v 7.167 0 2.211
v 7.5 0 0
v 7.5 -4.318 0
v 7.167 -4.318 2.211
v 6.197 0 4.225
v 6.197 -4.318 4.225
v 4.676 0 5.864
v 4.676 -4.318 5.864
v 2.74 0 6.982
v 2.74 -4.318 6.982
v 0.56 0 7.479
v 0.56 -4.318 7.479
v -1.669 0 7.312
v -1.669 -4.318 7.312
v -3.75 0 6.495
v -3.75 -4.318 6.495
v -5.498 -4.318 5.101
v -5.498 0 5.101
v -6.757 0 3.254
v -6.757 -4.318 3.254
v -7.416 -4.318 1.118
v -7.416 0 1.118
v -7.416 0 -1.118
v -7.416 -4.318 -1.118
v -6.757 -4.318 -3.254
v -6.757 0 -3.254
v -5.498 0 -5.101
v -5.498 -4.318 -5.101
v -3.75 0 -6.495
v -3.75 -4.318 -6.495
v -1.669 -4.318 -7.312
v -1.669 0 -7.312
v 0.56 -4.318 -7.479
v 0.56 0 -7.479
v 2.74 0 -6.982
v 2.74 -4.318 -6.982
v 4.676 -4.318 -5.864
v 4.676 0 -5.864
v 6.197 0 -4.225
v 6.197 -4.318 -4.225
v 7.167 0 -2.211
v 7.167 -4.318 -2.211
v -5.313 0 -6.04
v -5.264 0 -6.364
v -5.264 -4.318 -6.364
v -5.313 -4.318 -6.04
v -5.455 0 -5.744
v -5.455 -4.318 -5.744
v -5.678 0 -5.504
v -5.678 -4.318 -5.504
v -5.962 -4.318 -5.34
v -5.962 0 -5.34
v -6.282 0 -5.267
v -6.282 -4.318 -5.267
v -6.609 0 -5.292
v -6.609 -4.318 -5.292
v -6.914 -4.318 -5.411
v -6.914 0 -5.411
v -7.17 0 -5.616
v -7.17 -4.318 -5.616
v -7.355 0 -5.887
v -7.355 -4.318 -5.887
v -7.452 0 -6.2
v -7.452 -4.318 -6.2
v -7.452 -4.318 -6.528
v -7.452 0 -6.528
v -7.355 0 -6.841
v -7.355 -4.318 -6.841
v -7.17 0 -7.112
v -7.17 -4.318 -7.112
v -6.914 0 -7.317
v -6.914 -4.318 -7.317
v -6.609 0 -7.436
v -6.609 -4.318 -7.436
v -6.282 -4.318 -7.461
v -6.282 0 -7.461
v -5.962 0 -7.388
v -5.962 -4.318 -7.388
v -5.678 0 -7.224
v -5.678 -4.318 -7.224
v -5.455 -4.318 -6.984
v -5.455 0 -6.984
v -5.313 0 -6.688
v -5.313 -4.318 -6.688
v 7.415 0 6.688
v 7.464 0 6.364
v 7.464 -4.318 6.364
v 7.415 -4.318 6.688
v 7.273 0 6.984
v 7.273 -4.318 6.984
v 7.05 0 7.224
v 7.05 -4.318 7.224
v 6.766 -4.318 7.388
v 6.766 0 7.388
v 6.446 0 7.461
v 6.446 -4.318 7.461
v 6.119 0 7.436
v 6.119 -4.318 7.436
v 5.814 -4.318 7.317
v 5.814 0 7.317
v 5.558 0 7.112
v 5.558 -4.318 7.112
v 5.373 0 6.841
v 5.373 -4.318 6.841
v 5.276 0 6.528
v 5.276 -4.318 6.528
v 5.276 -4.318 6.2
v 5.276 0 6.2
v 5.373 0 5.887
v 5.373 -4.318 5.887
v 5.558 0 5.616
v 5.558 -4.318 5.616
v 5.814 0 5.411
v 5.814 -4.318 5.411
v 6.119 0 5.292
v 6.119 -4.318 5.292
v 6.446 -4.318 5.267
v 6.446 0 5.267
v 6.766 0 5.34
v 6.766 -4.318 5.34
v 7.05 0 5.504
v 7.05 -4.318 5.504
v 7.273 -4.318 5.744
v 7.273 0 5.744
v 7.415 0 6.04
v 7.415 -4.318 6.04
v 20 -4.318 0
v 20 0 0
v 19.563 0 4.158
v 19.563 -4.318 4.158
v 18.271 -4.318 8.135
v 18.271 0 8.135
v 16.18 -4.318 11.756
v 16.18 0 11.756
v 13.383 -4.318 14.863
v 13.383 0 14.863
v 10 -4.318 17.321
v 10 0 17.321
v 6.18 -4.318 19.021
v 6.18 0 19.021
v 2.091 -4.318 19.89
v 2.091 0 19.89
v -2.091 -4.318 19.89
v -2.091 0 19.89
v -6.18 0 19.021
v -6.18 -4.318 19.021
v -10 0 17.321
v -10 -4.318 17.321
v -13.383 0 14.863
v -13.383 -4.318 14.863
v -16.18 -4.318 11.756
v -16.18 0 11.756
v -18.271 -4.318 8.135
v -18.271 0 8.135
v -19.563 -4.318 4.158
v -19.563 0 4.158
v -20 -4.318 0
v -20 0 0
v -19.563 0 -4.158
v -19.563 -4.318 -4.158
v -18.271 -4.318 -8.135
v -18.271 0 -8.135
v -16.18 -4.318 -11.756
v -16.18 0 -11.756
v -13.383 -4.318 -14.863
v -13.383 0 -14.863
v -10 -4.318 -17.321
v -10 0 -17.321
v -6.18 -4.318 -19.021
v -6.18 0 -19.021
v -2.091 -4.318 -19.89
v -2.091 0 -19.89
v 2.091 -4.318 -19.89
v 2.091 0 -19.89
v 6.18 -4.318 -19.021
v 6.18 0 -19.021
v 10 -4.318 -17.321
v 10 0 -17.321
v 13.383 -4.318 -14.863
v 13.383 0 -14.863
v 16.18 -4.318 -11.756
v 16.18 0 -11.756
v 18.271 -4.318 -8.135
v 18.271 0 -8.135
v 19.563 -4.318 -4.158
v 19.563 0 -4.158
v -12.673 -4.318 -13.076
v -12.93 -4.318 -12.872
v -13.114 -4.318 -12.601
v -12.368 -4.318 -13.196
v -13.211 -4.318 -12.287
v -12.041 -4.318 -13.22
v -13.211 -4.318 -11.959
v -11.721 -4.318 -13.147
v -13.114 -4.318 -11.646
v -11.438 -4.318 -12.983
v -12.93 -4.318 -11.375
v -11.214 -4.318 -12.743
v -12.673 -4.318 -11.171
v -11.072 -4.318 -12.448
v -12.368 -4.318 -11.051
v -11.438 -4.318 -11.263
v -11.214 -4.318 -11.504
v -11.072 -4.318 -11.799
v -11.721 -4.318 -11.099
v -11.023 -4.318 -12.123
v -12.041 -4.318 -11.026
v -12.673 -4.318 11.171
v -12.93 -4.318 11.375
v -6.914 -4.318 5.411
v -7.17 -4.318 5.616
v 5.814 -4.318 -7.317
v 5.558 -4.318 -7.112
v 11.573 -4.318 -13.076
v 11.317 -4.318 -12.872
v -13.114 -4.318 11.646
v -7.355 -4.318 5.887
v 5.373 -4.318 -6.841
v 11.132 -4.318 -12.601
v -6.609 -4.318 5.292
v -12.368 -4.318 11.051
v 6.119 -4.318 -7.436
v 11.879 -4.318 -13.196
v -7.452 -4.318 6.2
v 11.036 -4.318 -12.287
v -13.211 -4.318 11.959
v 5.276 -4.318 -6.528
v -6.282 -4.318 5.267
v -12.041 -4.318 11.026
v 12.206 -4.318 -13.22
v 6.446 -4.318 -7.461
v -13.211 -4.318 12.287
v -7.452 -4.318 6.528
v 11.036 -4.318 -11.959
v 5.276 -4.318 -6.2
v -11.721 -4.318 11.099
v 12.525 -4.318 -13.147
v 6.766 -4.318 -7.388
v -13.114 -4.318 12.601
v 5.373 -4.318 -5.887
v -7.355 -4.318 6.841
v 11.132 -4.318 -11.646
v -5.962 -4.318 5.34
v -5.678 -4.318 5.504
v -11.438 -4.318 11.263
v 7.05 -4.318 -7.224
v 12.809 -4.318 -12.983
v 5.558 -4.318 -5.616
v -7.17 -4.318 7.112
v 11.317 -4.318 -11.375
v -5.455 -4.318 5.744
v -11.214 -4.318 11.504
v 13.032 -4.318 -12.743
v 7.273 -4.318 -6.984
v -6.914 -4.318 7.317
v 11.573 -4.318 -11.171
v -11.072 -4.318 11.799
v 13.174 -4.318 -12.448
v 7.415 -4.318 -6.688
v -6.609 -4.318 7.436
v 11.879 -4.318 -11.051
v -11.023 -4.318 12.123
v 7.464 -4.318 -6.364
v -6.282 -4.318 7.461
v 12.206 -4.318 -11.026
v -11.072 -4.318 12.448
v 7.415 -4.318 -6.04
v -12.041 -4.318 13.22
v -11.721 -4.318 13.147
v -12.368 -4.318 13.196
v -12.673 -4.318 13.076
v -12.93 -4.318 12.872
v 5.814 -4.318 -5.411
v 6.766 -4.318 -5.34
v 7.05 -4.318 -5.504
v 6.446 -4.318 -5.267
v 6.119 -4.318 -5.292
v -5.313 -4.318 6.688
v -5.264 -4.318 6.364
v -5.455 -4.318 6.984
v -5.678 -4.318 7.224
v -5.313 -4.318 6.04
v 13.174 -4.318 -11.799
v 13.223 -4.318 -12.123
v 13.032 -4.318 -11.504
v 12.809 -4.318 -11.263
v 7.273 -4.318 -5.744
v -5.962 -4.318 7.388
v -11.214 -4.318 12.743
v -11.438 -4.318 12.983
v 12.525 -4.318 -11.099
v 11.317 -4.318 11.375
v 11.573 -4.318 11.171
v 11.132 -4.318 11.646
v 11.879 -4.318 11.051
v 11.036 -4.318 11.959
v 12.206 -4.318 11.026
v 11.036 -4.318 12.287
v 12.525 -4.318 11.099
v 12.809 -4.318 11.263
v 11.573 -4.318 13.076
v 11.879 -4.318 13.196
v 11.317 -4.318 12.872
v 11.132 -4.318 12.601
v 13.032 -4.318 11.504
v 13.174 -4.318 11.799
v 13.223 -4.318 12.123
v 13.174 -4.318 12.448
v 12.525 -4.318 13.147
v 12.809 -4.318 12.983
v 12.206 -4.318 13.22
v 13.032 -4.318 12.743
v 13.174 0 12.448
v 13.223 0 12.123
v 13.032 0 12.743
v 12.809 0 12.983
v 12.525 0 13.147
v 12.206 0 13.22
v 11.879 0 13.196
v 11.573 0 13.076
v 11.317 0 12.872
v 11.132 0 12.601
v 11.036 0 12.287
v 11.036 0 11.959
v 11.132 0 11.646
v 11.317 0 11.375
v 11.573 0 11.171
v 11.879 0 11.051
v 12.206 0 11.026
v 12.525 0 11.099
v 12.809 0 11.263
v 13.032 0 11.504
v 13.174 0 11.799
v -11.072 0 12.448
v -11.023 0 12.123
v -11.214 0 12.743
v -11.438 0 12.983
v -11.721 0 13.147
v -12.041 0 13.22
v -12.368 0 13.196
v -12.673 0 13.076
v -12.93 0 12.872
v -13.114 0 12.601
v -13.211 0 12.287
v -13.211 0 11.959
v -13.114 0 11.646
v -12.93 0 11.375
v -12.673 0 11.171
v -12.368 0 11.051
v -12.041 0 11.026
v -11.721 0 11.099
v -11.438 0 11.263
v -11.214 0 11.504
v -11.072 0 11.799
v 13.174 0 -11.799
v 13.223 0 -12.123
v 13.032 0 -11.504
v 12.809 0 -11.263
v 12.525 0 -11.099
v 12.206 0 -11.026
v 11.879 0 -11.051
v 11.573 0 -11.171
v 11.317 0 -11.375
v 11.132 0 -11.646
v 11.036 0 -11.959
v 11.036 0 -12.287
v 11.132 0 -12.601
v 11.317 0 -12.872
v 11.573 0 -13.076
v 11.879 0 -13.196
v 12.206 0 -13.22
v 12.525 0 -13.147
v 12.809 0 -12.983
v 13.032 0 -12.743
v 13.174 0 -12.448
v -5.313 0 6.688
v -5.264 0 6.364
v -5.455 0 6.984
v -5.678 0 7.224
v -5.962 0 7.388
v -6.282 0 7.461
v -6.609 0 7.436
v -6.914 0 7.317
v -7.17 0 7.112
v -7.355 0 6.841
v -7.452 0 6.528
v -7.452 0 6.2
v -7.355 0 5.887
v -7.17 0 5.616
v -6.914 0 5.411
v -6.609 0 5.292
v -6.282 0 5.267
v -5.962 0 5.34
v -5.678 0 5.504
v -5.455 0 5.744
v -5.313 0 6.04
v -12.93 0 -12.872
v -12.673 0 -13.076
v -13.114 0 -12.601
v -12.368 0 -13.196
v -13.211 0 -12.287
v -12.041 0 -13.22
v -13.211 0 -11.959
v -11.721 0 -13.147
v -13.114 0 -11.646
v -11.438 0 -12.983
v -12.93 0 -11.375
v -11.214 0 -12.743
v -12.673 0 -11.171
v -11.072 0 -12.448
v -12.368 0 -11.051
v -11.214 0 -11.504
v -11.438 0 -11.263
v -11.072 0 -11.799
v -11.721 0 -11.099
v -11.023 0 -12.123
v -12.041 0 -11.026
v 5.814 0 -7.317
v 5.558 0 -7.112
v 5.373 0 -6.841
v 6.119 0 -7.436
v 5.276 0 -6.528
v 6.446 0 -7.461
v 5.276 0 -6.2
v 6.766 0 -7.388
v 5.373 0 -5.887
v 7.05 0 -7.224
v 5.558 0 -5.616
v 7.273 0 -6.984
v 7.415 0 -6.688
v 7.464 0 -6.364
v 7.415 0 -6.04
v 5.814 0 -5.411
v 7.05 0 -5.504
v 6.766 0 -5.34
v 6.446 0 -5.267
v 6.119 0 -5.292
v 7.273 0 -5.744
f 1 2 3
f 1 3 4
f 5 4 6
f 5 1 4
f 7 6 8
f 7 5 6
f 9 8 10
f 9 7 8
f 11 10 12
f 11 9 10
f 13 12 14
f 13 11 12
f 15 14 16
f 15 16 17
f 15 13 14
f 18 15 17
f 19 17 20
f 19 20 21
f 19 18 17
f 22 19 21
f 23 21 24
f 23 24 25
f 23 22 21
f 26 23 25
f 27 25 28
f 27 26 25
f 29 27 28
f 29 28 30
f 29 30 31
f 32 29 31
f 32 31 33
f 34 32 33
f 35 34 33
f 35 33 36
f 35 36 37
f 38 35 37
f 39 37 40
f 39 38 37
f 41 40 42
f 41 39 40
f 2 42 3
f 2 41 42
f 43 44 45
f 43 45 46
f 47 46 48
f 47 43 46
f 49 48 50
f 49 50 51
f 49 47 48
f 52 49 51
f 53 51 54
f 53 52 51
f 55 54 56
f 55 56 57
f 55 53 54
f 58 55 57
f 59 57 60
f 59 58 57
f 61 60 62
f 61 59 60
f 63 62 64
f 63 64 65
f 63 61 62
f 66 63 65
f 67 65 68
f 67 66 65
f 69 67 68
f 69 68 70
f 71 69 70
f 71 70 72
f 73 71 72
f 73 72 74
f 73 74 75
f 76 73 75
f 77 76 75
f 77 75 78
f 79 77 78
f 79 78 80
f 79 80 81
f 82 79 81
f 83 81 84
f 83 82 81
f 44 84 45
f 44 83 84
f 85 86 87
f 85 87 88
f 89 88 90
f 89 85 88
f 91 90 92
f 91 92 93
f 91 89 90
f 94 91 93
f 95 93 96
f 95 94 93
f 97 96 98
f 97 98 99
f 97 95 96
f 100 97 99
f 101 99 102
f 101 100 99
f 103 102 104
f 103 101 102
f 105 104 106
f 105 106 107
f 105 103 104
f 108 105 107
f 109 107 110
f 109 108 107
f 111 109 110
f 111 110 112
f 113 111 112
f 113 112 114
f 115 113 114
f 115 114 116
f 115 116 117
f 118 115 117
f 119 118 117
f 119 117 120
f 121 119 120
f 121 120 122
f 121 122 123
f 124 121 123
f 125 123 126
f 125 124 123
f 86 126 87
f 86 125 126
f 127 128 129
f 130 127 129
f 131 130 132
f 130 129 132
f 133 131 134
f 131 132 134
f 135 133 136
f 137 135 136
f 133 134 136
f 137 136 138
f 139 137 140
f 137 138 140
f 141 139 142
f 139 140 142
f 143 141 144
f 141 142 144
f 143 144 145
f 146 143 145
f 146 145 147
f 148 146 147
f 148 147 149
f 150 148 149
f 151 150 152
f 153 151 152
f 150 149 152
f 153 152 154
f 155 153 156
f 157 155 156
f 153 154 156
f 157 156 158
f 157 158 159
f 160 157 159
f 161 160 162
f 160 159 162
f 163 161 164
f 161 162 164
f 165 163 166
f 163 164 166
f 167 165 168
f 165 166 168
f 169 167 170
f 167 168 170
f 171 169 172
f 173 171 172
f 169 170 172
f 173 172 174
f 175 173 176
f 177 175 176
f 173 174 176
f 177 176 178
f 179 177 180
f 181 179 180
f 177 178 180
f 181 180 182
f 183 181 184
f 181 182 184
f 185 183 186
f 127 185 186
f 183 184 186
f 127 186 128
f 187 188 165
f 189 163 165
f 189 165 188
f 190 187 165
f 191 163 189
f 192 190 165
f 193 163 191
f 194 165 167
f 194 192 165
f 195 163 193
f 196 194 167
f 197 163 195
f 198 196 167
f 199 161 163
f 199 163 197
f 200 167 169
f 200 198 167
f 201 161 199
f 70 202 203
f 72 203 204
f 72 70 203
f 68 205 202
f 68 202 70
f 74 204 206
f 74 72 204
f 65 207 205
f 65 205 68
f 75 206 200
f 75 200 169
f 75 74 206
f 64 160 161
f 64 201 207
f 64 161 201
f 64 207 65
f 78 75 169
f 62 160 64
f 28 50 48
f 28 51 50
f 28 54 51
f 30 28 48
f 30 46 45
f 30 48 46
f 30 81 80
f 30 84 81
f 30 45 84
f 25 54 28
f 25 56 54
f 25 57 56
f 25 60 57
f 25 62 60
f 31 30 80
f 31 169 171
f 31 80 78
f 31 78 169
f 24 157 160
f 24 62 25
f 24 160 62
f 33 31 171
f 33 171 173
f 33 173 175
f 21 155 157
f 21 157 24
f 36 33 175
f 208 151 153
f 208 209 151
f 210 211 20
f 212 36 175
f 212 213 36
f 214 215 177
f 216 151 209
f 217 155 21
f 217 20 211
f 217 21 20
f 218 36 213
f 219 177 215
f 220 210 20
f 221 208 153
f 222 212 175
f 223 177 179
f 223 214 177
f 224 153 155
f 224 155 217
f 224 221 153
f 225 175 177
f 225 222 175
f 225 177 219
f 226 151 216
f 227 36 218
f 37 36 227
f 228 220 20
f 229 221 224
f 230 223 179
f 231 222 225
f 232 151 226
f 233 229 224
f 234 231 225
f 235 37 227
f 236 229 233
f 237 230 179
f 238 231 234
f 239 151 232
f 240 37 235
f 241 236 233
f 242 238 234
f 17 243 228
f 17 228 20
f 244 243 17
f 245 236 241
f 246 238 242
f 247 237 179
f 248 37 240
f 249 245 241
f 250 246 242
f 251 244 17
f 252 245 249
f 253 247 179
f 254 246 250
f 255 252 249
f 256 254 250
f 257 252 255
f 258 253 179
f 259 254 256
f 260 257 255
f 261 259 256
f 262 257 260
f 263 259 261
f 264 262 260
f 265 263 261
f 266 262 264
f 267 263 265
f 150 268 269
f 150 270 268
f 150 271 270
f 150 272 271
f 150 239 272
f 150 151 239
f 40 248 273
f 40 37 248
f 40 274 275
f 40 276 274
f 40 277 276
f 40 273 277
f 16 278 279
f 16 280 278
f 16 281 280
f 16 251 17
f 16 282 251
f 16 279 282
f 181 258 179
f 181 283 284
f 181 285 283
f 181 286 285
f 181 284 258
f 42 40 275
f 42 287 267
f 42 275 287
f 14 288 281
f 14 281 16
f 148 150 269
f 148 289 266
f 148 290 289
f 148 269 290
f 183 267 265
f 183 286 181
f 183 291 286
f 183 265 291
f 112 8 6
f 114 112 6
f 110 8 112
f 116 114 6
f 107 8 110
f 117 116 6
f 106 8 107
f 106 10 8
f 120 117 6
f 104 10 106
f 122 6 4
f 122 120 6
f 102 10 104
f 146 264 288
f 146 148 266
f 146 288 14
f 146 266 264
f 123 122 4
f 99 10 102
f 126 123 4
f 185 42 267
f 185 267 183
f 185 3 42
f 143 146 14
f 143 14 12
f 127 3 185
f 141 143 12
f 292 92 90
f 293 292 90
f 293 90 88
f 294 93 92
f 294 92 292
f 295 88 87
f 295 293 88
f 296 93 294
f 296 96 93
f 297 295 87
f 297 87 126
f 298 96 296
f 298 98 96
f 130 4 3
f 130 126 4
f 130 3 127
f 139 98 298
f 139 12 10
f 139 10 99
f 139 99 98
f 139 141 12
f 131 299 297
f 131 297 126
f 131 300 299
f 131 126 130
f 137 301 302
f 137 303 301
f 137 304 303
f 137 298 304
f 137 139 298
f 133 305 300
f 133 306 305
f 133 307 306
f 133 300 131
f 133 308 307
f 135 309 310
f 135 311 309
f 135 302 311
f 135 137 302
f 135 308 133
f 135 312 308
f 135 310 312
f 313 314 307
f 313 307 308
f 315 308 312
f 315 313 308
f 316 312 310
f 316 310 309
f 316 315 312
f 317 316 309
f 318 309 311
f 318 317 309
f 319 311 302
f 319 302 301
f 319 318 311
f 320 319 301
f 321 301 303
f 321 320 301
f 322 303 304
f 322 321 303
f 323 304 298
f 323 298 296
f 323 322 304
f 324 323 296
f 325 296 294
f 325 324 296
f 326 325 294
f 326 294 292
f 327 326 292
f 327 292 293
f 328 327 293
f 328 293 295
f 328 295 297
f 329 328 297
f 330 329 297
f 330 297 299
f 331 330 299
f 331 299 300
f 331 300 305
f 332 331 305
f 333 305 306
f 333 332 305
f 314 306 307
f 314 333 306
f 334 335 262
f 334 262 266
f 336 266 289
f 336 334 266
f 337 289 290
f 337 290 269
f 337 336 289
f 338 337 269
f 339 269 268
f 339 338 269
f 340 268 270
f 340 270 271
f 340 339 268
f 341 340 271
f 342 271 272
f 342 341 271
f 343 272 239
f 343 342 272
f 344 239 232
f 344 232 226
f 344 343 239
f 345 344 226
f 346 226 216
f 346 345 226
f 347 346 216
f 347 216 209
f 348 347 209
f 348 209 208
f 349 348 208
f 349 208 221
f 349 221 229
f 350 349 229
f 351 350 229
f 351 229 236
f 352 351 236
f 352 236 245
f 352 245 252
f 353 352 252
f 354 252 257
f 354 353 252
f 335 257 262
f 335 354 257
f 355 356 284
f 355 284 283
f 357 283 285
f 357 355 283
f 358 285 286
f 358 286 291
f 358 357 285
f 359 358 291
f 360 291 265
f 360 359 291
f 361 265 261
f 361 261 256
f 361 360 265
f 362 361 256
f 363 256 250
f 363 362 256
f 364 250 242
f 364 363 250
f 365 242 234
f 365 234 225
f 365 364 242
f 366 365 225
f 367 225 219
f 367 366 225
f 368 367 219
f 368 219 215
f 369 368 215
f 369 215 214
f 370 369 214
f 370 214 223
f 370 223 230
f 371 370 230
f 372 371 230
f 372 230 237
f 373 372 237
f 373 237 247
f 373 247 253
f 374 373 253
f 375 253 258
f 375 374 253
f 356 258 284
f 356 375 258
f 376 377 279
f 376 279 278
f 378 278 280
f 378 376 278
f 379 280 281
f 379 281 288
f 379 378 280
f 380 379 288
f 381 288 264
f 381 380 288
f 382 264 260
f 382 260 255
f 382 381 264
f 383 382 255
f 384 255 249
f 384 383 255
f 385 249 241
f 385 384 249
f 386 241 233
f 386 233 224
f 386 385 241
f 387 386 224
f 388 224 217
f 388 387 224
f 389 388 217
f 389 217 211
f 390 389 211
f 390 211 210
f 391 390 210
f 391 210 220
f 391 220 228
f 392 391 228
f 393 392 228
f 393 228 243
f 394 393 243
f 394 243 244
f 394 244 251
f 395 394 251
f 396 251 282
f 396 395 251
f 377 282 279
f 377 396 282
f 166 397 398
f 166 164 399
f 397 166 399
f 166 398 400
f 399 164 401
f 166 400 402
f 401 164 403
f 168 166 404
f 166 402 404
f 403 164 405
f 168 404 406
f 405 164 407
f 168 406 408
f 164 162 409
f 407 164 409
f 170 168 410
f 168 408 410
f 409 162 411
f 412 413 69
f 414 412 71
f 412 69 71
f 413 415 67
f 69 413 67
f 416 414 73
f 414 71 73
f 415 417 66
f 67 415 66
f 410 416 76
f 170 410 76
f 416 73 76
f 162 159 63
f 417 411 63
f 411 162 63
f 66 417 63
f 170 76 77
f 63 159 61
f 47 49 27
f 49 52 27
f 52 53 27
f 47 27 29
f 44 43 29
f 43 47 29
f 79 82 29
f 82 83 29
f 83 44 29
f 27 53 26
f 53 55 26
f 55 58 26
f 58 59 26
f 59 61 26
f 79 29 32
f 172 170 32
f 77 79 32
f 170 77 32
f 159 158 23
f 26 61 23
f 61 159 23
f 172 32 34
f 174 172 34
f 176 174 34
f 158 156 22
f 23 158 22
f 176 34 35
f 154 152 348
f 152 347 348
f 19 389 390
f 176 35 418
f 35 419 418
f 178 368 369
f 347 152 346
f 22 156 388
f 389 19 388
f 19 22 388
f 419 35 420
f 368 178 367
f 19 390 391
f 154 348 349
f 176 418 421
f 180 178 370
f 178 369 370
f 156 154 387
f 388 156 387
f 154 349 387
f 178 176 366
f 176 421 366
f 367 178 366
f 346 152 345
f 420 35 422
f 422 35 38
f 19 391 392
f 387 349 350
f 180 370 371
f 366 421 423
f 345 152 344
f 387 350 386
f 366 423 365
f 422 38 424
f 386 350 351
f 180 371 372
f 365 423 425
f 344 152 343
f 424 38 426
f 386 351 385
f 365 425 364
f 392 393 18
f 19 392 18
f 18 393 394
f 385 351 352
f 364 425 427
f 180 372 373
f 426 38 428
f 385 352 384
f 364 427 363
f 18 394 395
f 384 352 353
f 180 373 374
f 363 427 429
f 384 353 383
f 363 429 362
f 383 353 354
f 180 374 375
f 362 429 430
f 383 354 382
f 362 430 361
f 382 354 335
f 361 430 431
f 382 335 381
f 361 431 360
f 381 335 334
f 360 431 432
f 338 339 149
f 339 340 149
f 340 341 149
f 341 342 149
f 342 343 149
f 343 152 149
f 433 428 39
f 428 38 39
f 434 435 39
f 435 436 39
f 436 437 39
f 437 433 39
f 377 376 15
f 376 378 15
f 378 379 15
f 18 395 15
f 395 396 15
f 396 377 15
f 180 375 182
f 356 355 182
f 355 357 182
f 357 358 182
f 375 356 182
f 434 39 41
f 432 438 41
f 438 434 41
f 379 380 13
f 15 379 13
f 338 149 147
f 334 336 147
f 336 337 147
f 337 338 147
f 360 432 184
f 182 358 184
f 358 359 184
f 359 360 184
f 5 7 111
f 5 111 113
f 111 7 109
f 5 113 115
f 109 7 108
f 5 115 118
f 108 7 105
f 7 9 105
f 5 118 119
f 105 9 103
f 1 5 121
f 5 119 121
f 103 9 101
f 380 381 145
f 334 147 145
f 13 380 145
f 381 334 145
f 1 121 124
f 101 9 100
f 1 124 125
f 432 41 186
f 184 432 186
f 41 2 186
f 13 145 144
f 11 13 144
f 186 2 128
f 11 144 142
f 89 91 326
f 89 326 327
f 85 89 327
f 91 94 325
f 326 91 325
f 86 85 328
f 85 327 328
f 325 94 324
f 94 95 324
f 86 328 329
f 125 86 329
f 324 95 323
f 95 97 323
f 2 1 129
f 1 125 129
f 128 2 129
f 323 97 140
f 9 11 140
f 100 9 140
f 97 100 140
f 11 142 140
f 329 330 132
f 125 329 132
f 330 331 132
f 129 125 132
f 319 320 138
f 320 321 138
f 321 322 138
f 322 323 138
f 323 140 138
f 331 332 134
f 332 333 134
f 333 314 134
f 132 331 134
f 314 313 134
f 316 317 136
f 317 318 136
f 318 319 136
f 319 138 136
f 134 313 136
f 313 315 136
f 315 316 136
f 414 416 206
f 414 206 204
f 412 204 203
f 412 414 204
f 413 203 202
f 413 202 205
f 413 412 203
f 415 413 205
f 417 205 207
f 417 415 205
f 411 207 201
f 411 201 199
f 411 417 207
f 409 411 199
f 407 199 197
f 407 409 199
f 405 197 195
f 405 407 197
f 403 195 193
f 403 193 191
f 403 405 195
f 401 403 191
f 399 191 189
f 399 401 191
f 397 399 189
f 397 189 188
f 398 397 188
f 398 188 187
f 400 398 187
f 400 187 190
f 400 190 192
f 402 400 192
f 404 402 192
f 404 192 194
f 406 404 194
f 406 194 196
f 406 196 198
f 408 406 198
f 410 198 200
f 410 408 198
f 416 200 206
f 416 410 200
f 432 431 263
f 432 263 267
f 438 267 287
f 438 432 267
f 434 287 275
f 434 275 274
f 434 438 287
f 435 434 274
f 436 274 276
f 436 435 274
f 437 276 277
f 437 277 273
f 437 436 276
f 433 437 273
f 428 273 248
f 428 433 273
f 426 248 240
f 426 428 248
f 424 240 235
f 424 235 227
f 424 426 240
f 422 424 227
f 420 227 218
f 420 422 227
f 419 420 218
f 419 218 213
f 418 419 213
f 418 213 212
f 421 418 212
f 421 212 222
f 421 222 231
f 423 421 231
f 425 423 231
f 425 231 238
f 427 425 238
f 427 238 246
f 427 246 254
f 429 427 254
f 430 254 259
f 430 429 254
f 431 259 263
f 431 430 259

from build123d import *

# Parameters (mm, degrees)
F0_R     = 20
F0_R_2   = 1.1
F0_R_3   = 7.5
F1_DEPTH = 4.318


with BuildPart() as f1:
    # F0 (on Front) → F1 (new body)
    with BuildSketch(Plane.XZ):
        Circle(F0_R)
        with Locations((-12.123346, -12.123346)):
            Circle(F0_R_2, mode=Mode.SUBTRACT)
        with Locations((-6.363961, -6.363961)):
            Circle(F0_R_2, mode=Mode.SUBTRACT)
        with Locations((12.123346, -12.123346)):
            Circle(F0_R_2, mode=Mode.SUBTRACT)
        with Locations((6.363961, -6.363961)):
            Circle(F0_R_2, mode=Mode.SUBTRACT)
        with Locations((-6.363961, 6.363961)):
            Circle(F0_R_2, mode=Mode.SUBTRACT)
        with Locations((-12.123346, 12.123346)):
            Circle(F0_R_2, mode=Mode.SUBTRACT)
        Circle(F0_R_3, mode=Mode.SUBTRACT)
        with Locations((6.363961, 6.363961)):
            Circle(F0_R_2, mode=Mode.SUBTRACT)
        with Locations((12.123346, 12.123346)):
            Circle(F0_R_2, mode=Mode.SUBTRACT)
    extrude(amount=F1_DEPTH)


solid = f1.part
